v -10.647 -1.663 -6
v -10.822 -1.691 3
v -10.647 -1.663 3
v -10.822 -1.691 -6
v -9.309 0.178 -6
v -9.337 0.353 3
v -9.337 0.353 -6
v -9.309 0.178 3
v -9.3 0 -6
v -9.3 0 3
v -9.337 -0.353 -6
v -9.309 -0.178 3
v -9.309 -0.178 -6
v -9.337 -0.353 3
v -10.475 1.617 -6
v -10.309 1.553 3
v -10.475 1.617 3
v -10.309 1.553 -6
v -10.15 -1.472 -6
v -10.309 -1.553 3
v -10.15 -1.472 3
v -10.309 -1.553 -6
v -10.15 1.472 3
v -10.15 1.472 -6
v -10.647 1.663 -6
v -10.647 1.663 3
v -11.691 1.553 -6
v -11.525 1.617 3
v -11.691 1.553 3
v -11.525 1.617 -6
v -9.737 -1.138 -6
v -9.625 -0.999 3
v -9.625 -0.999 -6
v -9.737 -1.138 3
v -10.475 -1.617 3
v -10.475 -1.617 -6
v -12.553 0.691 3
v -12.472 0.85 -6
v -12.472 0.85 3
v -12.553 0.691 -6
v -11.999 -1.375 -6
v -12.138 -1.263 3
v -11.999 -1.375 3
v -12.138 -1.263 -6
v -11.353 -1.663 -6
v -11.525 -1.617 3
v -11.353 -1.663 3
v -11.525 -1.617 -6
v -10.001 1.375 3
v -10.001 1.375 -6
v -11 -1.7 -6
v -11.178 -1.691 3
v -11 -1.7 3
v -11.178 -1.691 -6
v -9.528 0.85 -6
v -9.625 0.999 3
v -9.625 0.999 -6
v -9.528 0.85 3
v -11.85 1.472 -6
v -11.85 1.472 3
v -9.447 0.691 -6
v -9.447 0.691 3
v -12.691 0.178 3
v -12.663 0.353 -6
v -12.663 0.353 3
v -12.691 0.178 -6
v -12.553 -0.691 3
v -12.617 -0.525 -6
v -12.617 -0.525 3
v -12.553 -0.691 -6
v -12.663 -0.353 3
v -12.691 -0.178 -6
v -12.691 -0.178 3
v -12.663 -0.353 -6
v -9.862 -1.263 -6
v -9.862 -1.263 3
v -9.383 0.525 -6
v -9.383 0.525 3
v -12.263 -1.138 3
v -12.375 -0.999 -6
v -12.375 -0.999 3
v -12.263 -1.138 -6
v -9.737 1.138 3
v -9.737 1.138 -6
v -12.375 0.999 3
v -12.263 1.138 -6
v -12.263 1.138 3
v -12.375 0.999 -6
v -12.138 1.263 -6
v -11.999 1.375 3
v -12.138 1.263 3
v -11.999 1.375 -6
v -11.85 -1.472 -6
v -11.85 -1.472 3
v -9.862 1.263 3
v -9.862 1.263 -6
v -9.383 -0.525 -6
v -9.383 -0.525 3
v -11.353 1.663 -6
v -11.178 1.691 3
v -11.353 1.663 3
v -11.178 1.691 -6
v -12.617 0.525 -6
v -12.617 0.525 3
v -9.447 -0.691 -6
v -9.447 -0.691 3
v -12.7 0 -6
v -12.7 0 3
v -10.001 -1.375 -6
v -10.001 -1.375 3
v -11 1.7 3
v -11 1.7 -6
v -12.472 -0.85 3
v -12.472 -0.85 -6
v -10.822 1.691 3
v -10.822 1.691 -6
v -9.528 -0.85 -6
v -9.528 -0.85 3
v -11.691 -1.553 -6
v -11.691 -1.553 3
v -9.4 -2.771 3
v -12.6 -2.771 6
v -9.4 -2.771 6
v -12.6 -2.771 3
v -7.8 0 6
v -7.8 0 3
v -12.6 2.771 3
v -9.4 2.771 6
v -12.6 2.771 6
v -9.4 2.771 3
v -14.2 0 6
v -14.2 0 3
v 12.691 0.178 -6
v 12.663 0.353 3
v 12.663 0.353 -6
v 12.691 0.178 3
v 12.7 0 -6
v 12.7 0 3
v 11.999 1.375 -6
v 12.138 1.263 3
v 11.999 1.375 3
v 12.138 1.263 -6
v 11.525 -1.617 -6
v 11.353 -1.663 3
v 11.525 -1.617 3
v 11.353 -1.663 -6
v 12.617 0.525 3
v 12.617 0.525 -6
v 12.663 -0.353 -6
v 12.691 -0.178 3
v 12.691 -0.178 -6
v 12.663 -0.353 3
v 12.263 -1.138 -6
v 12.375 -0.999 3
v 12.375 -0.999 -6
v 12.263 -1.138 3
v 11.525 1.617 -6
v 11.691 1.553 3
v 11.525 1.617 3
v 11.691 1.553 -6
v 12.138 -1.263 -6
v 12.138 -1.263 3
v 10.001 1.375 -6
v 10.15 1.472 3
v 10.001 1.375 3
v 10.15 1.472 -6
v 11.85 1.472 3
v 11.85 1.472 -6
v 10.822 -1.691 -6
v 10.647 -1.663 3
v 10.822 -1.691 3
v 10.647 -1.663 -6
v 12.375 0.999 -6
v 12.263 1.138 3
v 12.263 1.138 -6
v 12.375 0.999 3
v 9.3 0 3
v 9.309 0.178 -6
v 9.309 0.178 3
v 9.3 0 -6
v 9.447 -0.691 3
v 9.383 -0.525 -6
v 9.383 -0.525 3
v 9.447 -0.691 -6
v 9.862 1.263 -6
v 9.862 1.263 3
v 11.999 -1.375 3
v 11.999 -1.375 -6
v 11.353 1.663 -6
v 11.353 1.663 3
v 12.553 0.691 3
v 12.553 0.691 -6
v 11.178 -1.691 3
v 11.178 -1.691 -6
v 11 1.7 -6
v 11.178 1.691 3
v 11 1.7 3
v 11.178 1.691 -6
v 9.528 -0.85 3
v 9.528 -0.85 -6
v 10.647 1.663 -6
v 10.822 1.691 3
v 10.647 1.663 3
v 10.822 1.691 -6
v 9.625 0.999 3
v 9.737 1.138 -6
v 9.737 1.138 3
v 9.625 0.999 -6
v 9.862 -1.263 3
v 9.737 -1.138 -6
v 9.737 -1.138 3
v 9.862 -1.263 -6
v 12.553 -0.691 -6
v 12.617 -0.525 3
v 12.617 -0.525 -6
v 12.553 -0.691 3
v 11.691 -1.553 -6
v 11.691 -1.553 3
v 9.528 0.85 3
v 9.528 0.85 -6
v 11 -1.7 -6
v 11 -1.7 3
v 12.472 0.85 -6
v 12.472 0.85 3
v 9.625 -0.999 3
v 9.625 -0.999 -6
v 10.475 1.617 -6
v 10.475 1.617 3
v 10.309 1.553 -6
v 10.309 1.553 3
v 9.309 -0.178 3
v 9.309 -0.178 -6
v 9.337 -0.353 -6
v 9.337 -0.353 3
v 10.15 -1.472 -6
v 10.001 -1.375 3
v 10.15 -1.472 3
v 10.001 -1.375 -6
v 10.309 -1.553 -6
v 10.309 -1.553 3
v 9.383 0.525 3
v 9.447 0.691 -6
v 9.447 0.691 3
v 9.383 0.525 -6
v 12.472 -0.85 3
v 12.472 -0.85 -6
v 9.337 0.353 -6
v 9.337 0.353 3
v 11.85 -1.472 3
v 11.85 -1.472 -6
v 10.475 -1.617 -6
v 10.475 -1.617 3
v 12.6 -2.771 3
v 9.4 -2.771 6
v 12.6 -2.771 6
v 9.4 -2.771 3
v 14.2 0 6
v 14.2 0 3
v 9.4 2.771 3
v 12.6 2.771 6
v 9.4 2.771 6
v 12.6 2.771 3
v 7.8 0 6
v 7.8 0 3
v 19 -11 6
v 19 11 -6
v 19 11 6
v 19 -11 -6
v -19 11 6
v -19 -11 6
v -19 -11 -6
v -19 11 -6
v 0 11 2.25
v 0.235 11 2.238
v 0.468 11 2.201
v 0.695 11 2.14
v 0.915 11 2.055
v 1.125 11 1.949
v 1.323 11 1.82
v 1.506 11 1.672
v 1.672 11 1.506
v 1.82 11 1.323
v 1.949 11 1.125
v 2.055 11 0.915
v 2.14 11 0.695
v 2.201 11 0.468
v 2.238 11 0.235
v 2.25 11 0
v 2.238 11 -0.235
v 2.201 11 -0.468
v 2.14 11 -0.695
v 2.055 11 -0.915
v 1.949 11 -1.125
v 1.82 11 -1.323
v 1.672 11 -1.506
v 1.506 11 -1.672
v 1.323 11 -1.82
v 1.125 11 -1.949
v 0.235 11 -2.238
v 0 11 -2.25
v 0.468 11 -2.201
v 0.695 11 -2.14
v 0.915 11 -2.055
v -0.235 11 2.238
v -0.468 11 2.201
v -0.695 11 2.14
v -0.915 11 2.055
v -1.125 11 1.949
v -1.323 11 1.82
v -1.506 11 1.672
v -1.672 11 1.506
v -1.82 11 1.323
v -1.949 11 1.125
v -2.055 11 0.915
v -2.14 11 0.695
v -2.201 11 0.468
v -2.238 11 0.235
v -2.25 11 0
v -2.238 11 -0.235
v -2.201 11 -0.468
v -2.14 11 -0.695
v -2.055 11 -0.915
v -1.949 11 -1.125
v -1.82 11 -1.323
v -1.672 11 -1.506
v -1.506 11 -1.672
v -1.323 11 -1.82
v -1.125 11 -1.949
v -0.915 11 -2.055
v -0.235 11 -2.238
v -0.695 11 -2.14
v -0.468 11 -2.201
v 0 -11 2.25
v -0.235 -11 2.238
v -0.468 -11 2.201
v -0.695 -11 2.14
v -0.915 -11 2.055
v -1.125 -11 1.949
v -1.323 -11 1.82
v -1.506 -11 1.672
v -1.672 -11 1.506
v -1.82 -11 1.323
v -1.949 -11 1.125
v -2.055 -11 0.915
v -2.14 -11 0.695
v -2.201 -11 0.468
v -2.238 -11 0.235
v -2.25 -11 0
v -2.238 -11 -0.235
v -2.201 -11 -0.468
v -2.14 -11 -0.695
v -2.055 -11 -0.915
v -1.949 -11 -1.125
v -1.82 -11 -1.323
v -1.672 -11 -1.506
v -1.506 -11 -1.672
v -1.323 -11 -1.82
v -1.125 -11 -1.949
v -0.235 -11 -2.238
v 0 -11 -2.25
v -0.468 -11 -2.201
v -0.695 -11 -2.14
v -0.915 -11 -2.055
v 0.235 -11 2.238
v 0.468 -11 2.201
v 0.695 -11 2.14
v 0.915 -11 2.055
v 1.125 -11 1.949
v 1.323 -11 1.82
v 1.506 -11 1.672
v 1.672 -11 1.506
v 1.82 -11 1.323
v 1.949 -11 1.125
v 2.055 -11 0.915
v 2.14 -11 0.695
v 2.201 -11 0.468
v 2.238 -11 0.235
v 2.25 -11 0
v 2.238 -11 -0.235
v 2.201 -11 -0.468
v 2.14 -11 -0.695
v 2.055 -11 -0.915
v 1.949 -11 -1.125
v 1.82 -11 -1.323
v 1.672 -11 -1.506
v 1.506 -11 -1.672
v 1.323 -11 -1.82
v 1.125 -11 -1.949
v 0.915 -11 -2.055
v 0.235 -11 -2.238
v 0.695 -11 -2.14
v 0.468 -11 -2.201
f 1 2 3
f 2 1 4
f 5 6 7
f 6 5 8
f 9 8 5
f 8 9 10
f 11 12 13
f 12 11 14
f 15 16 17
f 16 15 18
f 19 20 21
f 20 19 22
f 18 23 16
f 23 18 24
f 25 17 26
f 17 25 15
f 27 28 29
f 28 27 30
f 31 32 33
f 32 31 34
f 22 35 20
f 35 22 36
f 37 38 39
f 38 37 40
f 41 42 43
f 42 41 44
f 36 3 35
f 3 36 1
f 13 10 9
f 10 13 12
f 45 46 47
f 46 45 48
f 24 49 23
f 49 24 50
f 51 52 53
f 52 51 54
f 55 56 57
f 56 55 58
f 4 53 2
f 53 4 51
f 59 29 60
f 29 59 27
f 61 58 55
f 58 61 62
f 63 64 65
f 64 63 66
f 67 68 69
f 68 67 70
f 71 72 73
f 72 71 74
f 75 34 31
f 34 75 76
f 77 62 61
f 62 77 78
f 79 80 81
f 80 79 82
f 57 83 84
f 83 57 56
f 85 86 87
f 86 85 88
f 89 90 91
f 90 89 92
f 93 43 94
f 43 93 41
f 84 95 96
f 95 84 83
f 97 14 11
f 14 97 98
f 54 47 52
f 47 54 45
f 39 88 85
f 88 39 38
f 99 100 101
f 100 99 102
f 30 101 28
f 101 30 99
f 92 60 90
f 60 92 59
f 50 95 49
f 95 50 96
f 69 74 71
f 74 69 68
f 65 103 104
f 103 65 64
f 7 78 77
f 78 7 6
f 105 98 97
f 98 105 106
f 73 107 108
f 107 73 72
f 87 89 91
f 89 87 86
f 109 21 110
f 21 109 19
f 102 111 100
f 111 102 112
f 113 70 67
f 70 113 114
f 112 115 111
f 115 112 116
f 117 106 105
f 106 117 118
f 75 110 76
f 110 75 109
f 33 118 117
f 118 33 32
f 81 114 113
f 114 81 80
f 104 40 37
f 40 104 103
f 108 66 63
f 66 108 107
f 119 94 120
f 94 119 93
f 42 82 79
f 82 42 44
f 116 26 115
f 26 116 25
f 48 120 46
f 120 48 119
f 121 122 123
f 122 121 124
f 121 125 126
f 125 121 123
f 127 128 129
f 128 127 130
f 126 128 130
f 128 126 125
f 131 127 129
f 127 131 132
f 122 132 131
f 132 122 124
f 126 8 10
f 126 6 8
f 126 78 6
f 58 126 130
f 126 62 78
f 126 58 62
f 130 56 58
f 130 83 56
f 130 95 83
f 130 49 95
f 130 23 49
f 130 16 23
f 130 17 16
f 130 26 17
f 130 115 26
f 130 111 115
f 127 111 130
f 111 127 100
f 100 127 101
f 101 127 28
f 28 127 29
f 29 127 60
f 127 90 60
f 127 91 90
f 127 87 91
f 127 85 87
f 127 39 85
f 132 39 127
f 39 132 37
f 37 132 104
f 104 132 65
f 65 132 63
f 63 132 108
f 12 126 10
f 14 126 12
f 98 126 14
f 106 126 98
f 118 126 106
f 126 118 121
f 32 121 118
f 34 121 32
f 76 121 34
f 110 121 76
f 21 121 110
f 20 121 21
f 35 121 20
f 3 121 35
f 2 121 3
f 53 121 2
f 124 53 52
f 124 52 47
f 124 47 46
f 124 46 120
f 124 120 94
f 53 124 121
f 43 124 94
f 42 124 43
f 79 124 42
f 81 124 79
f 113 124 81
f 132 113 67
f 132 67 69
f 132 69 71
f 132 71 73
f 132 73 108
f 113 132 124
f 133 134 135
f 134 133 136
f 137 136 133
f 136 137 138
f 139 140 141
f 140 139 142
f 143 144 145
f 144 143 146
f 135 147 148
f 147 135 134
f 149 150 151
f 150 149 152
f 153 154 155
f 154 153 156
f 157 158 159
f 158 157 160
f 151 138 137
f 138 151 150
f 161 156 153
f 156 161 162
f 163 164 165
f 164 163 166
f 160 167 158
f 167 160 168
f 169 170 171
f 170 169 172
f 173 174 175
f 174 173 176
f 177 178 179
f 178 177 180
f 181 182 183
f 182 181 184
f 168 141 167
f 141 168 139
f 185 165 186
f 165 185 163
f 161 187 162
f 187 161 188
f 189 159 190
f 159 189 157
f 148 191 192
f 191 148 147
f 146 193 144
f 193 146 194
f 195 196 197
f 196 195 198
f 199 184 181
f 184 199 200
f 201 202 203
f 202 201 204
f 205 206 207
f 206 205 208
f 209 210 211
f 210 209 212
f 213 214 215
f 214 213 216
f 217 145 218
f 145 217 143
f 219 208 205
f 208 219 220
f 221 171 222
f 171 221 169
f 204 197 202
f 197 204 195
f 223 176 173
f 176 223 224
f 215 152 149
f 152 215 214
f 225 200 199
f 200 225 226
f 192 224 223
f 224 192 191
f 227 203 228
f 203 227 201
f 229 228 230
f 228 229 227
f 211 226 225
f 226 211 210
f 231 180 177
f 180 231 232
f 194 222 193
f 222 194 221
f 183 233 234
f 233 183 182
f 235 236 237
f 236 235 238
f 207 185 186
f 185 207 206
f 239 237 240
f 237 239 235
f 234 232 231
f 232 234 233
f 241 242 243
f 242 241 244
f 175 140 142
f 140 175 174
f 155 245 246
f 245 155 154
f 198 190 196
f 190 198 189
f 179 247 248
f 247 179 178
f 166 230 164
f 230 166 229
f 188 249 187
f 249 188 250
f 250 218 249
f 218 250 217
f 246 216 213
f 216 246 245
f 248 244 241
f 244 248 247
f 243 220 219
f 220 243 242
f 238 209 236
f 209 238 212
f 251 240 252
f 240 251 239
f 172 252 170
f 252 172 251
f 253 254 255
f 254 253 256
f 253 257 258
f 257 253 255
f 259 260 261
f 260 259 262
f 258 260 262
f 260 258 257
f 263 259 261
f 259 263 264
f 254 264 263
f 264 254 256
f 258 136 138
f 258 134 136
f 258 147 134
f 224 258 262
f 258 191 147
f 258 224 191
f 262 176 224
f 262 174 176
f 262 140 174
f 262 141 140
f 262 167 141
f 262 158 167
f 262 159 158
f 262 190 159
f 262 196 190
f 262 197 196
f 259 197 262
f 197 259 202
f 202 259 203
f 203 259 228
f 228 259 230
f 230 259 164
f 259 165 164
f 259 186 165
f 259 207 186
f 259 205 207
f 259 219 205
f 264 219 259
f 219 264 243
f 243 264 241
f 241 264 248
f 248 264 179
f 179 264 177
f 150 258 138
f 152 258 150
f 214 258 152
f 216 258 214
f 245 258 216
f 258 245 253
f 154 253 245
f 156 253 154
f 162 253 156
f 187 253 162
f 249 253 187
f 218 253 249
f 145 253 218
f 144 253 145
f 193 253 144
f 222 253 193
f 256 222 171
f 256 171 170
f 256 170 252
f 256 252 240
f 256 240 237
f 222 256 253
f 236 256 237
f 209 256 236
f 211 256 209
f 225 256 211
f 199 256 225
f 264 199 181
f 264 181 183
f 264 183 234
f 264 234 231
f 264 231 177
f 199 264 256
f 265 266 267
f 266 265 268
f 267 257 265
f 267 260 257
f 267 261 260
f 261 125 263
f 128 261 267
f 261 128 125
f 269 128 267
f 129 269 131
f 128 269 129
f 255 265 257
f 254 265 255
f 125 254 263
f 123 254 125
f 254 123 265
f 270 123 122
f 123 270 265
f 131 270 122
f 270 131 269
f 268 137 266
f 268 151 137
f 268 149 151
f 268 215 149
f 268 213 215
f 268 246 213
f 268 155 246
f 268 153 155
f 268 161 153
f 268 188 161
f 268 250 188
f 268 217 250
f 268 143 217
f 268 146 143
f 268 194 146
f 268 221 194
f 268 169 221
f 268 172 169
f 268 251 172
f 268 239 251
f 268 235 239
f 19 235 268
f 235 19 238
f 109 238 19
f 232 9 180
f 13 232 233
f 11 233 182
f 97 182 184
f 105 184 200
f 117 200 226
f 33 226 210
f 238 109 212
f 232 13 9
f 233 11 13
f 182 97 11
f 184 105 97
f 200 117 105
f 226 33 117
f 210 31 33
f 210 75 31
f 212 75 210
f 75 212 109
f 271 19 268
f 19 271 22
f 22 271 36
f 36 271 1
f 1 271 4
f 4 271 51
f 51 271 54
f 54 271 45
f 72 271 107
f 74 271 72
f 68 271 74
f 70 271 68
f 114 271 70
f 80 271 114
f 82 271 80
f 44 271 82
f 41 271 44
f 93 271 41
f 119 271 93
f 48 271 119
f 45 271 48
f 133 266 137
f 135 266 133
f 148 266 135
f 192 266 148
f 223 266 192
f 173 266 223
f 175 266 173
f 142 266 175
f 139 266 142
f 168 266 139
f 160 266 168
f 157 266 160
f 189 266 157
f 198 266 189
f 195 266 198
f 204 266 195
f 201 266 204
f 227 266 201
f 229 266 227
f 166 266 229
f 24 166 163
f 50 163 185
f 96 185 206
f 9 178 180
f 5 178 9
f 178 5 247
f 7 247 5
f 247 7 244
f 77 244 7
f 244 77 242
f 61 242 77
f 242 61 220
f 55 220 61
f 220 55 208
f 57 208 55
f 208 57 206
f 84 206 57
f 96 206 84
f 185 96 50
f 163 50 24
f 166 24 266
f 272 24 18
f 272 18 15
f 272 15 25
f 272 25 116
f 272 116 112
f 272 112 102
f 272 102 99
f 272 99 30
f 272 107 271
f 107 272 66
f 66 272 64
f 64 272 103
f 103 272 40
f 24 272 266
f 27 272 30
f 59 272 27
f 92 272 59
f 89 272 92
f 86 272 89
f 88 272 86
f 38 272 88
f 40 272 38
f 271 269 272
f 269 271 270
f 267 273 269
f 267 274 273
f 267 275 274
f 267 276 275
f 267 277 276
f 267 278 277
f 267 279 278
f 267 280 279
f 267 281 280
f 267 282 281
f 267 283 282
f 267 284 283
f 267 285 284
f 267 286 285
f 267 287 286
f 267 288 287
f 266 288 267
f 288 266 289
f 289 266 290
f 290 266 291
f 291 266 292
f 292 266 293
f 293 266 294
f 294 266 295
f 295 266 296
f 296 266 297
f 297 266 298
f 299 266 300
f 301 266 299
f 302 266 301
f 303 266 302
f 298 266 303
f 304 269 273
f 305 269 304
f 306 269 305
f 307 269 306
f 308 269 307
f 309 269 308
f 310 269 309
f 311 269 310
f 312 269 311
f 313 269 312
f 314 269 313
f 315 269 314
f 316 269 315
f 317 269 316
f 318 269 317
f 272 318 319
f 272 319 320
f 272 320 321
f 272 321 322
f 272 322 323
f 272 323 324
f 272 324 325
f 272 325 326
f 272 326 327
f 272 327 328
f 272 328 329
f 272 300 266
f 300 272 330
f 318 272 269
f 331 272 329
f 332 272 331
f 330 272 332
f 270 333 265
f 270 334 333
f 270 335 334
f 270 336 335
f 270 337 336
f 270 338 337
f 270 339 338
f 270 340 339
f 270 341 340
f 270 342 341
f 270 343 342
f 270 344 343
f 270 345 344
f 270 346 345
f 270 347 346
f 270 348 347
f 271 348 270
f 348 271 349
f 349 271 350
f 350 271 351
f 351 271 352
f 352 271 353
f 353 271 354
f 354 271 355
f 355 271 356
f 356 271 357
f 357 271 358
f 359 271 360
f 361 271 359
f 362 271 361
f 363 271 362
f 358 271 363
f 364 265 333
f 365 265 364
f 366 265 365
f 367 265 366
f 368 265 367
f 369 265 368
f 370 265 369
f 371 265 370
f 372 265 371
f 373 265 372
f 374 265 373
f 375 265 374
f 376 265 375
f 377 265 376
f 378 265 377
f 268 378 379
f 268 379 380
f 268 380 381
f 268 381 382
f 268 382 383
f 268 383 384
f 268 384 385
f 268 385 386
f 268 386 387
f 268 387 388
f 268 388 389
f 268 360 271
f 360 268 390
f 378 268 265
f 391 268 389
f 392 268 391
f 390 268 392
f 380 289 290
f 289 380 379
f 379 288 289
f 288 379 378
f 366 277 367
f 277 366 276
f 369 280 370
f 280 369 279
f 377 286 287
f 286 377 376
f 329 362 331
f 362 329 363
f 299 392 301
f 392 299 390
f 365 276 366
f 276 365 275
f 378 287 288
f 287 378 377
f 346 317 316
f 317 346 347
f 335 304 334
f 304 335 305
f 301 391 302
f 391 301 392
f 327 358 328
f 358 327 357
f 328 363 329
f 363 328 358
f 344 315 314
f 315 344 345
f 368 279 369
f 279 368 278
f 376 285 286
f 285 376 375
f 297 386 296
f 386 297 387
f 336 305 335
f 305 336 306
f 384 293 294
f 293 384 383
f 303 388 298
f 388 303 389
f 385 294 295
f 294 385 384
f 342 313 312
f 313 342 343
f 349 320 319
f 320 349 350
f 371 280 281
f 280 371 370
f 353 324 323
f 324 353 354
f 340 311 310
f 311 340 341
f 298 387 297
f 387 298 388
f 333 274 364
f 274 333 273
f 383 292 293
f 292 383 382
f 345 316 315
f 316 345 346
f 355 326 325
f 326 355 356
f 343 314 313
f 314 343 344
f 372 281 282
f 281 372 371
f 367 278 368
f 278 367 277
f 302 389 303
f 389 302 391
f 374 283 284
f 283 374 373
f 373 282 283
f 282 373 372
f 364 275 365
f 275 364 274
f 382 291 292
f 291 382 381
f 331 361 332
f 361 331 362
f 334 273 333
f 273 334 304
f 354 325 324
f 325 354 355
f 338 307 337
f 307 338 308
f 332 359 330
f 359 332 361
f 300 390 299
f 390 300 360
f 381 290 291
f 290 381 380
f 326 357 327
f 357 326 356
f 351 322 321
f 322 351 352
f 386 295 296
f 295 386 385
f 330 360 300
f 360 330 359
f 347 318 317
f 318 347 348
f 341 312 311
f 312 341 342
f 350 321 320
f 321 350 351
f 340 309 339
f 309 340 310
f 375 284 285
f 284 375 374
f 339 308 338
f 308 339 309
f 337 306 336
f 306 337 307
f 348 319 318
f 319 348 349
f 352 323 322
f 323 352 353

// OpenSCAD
// Cable strain-relief clamp for 4 mm bundle.
$fn = 60;
eps = 0.02;
body_l = 38;
body_w = 22;
body_h = 12;
cable_d = 4.5;
bolt_pitch = 22;
difference() {
    cube([body_l, body_w, body_h], center = true);
    translate([0, -body_w / 2 - eps, 0]) rotate([-90, 0, 0]) cylinder(d = cable_d, h = body_w + 2 * eps);
    for (x = [-bolt_pitch / 2, bolt_pitch / 2]) {
        translate([x, 0, -body_h / 2 - eps]) cylinder(d = 3.4, h = body_h + 2 * eps);
        translate([x, 0, body_h / 2 - 3]) cylinder(d = 6.4, h = 3 + eps, $fn = 6);
    }
}
